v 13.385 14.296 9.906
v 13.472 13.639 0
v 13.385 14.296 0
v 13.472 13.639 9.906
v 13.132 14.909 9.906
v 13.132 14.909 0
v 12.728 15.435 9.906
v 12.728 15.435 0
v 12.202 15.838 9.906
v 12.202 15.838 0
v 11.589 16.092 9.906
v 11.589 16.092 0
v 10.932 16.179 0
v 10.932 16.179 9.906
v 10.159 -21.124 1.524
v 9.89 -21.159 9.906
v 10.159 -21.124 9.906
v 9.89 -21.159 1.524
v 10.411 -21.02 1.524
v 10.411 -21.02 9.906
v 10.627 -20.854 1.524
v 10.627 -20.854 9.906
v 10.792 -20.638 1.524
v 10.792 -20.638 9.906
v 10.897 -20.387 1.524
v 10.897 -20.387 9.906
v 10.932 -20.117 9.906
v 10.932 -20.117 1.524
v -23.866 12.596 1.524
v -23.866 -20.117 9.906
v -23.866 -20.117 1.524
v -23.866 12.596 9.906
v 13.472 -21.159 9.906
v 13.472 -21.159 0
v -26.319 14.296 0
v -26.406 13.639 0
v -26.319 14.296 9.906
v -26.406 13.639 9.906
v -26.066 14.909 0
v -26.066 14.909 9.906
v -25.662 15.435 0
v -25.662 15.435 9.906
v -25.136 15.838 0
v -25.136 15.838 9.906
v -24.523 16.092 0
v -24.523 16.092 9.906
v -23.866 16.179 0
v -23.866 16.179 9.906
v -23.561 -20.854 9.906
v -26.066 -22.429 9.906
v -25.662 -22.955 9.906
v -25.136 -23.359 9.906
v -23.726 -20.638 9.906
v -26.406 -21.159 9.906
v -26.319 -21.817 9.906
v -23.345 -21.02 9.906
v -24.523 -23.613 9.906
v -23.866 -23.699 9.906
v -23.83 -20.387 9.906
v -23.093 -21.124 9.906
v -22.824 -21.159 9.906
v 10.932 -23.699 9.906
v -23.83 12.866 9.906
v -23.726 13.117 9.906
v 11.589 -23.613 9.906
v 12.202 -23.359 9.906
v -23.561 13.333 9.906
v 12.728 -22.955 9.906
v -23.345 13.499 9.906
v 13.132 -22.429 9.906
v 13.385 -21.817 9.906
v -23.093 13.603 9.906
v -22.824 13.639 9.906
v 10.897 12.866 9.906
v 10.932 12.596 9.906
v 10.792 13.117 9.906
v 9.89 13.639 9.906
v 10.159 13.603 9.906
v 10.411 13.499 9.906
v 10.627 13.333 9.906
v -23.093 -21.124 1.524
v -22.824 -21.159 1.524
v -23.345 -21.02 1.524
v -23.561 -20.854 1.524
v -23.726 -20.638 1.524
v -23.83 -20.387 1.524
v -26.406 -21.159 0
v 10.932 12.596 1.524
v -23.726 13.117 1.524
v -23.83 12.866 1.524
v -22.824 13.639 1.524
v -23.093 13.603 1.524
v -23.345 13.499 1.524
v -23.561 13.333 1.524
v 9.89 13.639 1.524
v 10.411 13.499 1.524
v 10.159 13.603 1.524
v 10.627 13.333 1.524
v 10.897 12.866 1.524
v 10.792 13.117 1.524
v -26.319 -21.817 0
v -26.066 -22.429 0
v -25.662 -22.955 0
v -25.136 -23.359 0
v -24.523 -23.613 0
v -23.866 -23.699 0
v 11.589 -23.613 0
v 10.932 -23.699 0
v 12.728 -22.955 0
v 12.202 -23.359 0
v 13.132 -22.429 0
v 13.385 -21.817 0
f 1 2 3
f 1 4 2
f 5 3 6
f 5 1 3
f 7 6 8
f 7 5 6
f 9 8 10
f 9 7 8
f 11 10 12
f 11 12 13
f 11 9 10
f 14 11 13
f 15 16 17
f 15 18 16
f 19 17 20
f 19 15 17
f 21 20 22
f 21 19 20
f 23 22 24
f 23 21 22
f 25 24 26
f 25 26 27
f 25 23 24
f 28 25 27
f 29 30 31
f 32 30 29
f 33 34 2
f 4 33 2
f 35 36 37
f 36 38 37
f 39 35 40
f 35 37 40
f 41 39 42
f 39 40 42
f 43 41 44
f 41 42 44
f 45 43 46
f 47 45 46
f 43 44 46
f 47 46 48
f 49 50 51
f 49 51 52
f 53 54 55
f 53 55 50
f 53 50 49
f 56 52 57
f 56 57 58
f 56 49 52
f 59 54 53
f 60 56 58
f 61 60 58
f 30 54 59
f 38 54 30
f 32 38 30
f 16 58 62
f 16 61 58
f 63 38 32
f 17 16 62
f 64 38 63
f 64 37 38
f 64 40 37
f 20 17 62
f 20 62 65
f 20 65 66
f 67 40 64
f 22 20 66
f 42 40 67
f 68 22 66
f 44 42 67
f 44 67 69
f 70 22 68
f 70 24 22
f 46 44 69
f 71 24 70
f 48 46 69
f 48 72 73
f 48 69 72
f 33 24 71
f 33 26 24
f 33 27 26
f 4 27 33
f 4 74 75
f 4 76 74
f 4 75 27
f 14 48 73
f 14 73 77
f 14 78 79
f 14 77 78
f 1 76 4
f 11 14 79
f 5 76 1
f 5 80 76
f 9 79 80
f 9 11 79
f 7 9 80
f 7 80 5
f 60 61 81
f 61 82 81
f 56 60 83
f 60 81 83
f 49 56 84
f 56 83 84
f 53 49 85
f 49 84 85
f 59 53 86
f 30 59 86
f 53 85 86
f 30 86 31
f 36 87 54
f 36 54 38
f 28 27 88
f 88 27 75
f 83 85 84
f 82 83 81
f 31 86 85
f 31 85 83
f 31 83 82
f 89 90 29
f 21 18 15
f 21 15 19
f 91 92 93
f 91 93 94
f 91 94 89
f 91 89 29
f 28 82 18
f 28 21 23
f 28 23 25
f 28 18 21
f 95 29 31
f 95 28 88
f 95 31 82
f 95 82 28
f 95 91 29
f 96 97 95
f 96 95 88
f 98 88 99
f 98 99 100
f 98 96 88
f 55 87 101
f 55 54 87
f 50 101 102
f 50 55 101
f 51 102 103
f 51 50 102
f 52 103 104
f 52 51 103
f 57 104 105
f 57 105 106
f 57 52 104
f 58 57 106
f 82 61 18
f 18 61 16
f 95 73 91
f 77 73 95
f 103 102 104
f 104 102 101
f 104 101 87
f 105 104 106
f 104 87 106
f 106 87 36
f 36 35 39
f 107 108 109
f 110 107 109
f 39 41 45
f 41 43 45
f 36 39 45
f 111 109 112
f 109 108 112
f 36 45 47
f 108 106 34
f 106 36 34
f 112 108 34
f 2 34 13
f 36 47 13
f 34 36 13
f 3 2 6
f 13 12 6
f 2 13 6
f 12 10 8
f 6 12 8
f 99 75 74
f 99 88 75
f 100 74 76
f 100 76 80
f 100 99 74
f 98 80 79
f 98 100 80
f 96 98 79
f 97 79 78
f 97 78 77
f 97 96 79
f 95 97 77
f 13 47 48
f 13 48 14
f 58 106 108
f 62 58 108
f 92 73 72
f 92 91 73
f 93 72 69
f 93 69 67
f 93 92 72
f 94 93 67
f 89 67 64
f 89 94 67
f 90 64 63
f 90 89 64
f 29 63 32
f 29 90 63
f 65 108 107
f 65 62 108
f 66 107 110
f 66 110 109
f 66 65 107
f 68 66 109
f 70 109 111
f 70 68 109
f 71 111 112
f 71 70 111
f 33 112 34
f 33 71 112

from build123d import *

# Parameters (mm, degrees)
F0_W     = 39.878
F0_H     = 39.878
F1_DEPTH = 9.906
F2_R     = 2.54
F3_W     = 34.798
F3_H     = 34.798
F4_DEPTH = 8.382
F5_R     = 1.042457


with BuildPart() as f1:
    # F0 (on Top) → F1 (new body)
    with BuildSketch(Plane.XY):
        with Locations((-6.466975, -3.760295)):
            Rectangle(F0_W, F0_H)
    extrude(amount=F1_DEPTH)

    # F2
    f2_edges = [f1.edges().sort_by_distance(p)[0] for p in [
        (13.472025, -23.699295, 4.953),
        (-26.405975, -23.699295, 4.953),
        (-26.405975, 16.178705, 4.953),
        (13.472025, 16.178705, 4.953),
    ]]
    fillet(f2_edges, radius=F2_R)

    # F3 (on face) → F4 (cut)
    with BuildSketch(Plane.XY.offset(9.906)):
        with Locations((-6.466975, -3.760295)):
            Rectangle(F3_W, F3_H)
    extrude(amount=-F4_DEPTH, mode=Mode.SUBTRACT)

    # F5
    f5_edges = [f1.edges().sort_by_distance(p)[0] for p in [
        (-23.865975, 13.638705, 5.715),
        (10.932025, 13.638705, 5.715),
        (10.932025, -21.159295, 5.715),
        (-23.865975, -21.159295, 5.715),
    ]]
    fillet(f5_edges, radius=F5_R)


solid = f1.part
